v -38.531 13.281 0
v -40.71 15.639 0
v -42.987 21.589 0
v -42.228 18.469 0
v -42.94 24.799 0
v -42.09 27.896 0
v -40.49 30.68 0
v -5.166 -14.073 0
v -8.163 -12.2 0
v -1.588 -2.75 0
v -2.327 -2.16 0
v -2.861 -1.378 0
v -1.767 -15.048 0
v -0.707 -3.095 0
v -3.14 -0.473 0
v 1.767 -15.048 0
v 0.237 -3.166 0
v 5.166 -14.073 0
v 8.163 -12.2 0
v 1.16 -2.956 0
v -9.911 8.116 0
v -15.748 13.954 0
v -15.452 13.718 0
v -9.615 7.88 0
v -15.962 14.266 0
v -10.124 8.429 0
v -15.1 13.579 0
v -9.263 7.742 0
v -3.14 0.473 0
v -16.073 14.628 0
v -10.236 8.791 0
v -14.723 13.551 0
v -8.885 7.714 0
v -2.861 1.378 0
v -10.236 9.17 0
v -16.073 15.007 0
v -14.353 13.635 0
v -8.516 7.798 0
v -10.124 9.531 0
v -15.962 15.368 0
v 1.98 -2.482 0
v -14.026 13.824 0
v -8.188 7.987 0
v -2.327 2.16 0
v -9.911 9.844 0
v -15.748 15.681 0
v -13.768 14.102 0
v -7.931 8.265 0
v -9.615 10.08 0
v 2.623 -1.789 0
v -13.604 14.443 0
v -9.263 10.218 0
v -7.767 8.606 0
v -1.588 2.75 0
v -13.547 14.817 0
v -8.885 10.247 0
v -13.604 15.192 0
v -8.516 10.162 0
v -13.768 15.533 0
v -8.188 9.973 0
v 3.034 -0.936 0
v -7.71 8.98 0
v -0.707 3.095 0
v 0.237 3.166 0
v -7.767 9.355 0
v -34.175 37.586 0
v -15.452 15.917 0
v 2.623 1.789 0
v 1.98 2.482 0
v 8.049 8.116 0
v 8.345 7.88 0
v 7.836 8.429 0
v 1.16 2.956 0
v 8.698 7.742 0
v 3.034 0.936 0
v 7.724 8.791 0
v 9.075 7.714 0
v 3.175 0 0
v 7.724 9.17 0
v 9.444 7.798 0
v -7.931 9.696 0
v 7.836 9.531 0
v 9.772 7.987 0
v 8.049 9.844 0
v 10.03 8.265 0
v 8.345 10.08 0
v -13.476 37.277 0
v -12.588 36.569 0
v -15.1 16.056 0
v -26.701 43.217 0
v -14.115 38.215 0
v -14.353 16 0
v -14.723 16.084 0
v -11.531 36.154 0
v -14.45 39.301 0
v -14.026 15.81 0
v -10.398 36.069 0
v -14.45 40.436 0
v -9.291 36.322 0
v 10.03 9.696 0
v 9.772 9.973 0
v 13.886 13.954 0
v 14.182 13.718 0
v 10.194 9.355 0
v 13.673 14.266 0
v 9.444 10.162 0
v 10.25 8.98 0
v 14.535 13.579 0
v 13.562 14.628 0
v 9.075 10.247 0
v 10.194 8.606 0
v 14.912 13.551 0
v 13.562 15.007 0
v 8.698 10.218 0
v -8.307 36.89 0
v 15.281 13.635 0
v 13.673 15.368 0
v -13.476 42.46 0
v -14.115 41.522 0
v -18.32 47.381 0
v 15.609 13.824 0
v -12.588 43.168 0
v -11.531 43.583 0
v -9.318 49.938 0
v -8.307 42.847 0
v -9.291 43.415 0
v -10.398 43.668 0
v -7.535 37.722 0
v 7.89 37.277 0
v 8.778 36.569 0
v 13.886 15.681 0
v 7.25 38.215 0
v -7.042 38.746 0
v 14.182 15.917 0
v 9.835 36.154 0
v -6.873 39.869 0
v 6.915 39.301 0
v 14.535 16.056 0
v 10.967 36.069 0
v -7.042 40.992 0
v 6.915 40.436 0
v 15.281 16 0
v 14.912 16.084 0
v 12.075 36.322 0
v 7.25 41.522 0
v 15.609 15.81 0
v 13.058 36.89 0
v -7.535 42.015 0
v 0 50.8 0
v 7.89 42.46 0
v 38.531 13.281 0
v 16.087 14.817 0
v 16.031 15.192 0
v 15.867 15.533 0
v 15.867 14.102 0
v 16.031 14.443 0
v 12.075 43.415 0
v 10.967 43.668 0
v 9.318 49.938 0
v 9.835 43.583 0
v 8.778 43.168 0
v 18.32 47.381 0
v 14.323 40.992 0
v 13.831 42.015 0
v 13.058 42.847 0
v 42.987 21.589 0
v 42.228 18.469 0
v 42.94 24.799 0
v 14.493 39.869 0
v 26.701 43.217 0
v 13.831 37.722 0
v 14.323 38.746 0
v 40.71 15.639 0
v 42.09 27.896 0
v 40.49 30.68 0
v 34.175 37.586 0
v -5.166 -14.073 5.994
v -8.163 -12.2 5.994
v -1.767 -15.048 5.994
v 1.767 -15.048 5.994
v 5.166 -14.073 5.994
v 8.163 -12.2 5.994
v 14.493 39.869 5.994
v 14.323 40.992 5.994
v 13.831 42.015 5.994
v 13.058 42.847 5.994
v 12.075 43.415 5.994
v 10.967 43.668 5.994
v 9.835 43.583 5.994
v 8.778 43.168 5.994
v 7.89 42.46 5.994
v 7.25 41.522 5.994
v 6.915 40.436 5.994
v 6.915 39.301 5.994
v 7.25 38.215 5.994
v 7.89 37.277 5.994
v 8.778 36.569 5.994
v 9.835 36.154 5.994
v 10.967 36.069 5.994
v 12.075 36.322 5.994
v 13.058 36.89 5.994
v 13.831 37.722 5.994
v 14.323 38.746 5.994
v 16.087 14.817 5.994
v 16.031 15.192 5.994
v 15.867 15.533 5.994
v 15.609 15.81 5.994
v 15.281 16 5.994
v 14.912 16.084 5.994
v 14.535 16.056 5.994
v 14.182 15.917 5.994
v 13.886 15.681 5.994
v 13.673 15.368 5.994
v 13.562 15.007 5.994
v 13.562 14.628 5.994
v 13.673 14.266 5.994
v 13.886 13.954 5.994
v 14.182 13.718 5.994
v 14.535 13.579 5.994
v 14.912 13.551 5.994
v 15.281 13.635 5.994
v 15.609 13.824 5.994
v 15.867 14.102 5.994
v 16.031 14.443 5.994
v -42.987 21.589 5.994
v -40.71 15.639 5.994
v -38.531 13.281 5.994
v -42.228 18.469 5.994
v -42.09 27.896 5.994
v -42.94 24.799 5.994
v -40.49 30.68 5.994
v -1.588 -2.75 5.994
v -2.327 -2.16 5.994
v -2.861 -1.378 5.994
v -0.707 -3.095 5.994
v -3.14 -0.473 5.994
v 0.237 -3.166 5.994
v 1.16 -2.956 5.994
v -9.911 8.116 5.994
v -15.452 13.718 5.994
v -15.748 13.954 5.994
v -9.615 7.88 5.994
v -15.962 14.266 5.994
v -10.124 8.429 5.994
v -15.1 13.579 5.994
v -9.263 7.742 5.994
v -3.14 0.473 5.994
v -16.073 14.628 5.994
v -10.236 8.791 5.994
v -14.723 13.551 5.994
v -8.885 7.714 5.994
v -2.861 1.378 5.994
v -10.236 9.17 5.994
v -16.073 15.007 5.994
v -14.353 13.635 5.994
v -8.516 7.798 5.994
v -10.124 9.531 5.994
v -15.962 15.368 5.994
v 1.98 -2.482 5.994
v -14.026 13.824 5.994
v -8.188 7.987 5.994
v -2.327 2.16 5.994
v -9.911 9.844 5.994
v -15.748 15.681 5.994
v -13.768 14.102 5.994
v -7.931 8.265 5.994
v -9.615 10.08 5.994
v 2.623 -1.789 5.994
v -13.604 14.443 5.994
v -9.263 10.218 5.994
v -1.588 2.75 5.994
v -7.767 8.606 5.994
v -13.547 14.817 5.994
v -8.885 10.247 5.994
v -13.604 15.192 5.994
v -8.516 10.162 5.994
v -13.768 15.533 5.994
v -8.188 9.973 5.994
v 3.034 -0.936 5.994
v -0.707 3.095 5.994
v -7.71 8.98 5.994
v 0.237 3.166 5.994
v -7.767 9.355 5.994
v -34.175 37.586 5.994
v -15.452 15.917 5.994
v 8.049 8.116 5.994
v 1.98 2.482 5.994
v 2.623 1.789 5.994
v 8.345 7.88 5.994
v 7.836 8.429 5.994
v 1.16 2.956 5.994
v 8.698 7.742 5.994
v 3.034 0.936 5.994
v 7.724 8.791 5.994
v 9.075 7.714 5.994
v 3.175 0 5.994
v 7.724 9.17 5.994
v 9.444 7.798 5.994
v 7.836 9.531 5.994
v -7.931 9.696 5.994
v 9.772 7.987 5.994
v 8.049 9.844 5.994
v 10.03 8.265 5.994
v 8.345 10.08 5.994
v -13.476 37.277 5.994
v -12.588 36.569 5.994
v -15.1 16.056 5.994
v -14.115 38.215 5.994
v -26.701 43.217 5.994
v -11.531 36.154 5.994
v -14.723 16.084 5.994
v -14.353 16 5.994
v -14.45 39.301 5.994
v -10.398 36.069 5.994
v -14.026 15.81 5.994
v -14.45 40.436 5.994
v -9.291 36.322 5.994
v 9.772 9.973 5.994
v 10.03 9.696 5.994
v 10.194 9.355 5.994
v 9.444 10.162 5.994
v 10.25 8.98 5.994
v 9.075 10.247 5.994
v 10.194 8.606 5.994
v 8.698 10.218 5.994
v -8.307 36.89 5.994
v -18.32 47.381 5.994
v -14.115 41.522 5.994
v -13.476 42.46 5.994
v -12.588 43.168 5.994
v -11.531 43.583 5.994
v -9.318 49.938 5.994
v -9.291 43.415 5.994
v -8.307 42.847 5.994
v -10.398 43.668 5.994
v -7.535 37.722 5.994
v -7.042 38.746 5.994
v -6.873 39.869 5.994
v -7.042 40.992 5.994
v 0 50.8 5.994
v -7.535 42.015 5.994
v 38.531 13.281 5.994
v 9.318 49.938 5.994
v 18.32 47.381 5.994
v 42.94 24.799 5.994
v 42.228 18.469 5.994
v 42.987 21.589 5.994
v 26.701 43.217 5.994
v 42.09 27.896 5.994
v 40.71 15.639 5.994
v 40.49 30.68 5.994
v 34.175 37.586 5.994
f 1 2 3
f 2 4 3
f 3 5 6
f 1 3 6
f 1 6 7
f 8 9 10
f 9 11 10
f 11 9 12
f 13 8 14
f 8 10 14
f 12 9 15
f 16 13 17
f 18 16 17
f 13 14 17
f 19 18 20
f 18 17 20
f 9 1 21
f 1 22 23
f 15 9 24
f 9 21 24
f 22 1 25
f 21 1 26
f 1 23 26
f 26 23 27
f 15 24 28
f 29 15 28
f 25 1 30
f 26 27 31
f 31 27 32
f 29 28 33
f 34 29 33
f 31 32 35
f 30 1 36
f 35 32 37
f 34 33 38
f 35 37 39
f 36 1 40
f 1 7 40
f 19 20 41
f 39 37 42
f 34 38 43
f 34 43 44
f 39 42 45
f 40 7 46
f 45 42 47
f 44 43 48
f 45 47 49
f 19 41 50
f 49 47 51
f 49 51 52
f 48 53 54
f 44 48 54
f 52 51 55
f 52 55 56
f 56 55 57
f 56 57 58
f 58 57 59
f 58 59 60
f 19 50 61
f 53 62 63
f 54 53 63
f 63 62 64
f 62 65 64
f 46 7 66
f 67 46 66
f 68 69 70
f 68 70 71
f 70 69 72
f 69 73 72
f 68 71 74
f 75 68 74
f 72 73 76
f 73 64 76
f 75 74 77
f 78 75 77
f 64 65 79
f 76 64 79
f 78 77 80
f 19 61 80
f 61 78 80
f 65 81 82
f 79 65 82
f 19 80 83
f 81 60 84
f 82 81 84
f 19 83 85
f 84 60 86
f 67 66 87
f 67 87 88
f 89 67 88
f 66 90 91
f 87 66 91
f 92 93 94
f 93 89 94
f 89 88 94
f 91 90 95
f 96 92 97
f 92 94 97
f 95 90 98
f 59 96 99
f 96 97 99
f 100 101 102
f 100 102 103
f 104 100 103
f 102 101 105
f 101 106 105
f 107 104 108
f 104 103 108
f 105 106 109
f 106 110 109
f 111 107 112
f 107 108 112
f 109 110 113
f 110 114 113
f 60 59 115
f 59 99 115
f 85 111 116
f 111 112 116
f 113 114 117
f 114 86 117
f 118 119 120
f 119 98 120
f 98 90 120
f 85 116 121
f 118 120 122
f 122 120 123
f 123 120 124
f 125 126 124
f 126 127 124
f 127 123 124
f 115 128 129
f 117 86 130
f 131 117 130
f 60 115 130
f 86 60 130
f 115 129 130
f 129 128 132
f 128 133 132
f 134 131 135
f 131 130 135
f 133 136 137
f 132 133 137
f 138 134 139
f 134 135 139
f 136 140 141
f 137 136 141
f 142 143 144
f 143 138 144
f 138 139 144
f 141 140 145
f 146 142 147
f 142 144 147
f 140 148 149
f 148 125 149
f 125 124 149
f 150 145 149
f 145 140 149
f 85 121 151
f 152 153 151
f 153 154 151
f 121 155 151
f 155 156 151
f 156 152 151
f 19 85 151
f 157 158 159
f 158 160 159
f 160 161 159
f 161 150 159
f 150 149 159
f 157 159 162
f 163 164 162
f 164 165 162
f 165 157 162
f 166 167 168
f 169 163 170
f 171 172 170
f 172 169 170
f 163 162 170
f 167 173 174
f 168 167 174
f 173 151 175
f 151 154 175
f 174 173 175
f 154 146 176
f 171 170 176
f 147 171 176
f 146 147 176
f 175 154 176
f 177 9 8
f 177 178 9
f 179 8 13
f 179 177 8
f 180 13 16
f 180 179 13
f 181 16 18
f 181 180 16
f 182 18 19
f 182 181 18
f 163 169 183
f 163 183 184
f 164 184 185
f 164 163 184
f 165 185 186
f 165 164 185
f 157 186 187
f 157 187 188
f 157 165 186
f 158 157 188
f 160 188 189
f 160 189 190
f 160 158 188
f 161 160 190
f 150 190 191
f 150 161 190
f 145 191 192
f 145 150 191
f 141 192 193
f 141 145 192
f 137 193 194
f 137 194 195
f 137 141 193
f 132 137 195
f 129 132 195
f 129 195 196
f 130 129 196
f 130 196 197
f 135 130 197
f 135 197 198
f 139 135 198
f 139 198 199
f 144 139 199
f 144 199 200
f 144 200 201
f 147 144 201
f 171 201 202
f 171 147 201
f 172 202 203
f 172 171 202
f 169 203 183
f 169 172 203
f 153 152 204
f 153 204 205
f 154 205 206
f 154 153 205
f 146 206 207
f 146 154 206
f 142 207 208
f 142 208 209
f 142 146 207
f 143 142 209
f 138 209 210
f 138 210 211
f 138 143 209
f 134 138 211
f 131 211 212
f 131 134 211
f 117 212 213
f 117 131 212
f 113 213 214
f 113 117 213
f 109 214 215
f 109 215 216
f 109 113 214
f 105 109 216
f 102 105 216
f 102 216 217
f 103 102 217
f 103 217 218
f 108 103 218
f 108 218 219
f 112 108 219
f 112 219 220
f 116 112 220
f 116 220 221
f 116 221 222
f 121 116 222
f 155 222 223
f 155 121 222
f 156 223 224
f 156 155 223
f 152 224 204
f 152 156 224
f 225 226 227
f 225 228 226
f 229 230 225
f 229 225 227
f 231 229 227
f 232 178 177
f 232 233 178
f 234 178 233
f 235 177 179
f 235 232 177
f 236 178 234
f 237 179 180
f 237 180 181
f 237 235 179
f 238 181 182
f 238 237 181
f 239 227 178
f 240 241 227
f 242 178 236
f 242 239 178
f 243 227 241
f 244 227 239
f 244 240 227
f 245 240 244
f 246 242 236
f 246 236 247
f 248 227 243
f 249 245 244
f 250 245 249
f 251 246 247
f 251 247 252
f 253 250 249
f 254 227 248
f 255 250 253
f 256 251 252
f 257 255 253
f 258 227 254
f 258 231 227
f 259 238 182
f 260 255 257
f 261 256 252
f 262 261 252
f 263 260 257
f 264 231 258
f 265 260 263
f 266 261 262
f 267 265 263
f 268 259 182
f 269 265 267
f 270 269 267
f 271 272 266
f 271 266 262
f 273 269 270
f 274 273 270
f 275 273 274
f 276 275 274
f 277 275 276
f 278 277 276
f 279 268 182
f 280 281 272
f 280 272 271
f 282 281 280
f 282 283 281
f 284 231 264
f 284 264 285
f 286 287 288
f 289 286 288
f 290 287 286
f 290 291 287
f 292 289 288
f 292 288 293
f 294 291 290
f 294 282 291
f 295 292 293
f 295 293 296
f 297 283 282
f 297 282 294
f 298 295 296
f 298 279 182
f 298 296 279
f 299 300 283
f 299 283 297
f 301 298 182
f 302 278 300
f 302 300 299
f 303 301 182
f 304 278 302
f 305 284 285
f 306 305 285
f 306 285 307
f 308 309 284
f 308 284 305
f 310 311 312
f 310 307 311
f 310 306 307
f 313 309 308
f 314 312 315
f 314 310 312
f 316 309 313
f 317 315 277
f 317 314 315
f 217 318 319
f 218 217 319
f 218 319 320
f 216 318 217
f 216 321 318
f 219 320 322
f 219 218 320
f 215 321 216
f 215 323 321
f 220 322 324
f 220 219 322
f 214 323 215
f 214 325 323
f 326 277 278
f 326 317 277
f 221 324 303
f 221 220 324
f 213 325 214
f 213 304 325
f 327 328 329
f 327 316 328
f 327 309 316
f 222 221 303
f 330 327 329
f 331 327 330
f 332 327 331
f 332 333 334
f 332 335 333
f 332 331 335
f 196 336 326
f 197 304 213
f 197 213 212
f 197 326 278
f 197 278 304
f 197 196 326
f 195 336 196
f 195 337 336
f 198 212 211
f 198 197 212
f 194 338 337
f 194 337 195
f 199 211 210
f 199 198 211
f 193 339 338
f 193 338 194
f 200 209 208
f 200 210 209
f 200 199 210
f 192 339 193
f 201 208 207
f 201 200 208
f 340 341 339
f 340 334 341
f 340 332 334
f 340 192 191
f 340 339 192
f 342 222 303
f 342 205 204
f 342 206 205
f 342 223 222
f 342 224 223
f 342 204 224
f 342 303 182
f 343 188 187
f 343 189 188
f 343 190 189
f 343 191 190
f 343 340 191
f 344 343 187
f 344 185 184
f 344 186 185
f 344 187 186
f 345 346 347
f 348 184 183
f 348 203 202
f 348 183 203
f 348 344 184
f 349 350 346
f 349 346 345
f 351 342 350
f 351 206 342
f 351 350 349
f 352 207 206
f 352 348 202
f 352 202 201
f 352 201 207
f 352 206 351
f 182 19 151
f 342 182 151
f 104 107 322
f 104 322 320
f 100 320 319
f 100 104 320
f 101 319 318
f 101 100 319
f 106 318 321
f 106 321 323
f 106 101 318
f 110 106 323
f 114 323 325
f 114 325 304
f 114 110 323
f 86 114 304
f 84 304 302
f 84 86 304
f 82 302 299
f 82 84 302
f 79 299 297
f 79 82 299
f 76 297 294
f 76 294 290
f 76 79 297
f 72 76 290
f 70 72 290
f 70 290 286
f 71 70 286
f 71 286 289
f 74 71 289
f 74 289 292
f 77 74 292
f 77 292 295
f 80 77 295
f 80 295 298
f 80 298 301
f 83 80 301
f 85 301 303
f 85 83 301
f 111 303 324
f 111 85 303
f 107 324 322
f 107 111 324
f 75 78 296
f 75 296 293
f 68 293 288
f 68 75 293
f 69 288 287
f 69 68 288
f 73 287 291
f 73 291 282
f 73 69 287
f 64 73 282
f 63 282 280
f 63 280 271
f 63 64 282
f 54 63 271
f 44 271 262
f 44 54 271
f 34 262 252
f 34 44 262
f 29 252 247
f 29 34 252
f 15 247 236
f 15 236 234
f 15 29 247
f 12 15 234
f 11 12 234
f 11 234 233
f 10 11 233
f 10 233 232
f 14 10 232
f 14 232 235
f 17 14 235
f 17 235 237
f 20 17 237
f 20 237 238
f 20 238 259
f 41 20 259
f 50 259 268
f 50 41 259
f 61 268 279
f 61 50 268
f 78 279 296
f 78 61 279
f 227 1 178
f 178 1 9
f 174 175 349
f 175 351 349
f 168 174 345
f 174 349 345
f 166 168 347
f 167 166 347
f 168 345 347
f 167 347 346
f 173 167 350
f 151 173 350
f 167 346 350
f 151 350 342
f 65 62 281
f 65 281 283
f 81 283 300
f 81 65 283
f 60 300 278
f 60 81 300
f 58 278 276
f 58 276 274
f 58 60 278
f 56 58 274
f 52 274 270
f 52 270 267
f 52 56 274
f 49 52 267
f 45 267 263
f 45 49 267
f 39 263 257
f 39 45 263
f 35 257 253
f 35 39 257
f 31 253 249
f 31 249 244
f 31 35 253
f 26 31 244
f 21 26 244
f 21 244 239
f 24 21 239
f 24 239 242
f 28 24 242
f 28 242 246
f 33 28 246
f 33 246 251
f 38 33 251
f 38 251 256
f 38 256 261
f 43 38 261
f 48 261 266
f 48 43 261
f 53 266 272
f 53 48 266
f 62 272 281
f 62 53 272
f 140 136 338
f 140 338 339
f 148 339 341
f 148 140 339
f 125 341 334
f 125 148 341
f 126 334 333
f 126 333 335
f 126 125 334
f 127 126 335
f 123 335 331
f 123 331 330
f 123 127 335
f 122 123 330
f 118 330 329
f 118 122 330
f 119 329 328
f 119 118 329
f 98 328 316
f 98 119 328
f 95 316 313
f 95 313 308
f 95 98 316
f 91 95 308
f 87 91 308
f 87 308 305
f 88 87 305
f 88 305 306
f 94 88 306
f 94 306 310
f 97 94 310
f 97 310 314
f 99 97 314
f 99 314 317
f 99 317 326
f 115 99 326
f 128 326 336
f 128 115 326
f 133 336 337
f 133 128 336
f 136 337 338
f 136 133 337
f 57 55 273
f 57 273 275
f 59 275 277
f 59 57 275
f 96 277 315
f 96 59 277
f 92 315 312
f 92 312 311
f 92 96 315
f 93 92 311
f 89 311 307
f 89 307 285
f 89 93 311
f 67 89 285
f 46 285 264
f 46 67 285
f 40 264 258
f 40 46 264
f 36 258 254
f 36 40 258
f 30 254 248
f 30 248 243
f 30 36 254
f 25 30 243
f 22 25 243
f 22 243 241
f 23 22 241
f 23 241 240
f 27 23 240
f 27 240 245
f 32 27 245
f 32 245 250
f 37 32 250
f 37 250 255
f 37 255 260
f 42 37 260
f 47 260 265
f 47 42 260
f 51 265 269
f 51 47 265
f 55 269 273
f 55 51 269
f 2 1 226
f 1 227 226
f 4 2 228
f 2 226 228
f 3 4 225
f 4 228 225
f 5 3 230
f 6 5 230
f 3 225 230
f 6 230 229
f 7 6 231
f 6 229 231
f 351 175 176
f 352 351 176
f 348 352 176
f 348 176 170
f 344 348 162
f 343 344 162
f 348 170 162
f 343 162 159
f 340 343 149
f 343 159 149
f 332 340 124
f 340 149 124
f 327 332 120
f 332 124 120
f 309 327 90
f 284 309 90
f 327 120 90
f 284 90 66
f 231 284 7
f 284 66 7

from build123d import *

# Parameters (mm, degrees)
SKETCH1_R           = 3.81
SKETCH1_R_2         = 1.27
SKETCH1_R_3         = 3.175
BOSS_EXTRUDE1_DEPTH = 5.9944
FILLET1_R           = 12.7
FILLET2_R           = 12.7


with BuildPart() as part:
    # Sketch1 → Boss-Extrude1 (new body)
    with BuildSketch(Plane.XY):
        with BuildLine():
            Line((-46.655107065, 20.09828313), (0, -19.05))
            Line((0, -19.05), (46.655107065, 20.09828313))
            ThreePointArc((46.655107065, 20.09828313), (0, 50.8), (-46.655107065, 20.09828313))
        make_face()
        with Locations((-10.682756087, 39.86858848)):
            Circle(SKETCH1_R, mode=Mode.SUBTRACT)
        with Locations((10.682756087, 39.86858848)):
            Circle(SKETCH1_R, mode=Mode.SUBTRACT)
        with Locations((-14.8174226, 14.8174226)):
            Circle(SKETCH1_R_2, mode=Mode.SUBTRACT)
        with Locations((-8.980256121, 8.980256121)):
            Circle(SKETCH1_R_2, mode=Mode.SUBTRACT)
        with Locations((8.980256121, 8.980256121)):
            Circle(SKETCH1_R_2, mode=Mode.SUBTRACT)
        with Locations((14.8174226, 14.8174226)):
            Circle(SKETCH1_R_2, mode=Mode.SUBTRACT)
        Circle(SKETCH1_R_3, mode=Mode.SUBTRACT)
    extrude(amount=BOSS_EXTRUDE1_DEPTH)

    # Fillet1
    fillet1_edges = [part.edges().sort_by_distance(p)[0] for p in [
        (46.655107065, 20.09828313, 2.9972),
        (-46.655107065, 20.09828313, 2.9972),
    ]]
    fillet(fillet1_edges, radius=FILLET1_R)

    # Fillet2
    fillet2_edges = [part.edges().sort_by_distance(p)[0] for p in [
        (0, -19.05, 2.9972),
    ]]
    fillet(fillet2_edges, radius=FILLET2_R)


solid = part.part
